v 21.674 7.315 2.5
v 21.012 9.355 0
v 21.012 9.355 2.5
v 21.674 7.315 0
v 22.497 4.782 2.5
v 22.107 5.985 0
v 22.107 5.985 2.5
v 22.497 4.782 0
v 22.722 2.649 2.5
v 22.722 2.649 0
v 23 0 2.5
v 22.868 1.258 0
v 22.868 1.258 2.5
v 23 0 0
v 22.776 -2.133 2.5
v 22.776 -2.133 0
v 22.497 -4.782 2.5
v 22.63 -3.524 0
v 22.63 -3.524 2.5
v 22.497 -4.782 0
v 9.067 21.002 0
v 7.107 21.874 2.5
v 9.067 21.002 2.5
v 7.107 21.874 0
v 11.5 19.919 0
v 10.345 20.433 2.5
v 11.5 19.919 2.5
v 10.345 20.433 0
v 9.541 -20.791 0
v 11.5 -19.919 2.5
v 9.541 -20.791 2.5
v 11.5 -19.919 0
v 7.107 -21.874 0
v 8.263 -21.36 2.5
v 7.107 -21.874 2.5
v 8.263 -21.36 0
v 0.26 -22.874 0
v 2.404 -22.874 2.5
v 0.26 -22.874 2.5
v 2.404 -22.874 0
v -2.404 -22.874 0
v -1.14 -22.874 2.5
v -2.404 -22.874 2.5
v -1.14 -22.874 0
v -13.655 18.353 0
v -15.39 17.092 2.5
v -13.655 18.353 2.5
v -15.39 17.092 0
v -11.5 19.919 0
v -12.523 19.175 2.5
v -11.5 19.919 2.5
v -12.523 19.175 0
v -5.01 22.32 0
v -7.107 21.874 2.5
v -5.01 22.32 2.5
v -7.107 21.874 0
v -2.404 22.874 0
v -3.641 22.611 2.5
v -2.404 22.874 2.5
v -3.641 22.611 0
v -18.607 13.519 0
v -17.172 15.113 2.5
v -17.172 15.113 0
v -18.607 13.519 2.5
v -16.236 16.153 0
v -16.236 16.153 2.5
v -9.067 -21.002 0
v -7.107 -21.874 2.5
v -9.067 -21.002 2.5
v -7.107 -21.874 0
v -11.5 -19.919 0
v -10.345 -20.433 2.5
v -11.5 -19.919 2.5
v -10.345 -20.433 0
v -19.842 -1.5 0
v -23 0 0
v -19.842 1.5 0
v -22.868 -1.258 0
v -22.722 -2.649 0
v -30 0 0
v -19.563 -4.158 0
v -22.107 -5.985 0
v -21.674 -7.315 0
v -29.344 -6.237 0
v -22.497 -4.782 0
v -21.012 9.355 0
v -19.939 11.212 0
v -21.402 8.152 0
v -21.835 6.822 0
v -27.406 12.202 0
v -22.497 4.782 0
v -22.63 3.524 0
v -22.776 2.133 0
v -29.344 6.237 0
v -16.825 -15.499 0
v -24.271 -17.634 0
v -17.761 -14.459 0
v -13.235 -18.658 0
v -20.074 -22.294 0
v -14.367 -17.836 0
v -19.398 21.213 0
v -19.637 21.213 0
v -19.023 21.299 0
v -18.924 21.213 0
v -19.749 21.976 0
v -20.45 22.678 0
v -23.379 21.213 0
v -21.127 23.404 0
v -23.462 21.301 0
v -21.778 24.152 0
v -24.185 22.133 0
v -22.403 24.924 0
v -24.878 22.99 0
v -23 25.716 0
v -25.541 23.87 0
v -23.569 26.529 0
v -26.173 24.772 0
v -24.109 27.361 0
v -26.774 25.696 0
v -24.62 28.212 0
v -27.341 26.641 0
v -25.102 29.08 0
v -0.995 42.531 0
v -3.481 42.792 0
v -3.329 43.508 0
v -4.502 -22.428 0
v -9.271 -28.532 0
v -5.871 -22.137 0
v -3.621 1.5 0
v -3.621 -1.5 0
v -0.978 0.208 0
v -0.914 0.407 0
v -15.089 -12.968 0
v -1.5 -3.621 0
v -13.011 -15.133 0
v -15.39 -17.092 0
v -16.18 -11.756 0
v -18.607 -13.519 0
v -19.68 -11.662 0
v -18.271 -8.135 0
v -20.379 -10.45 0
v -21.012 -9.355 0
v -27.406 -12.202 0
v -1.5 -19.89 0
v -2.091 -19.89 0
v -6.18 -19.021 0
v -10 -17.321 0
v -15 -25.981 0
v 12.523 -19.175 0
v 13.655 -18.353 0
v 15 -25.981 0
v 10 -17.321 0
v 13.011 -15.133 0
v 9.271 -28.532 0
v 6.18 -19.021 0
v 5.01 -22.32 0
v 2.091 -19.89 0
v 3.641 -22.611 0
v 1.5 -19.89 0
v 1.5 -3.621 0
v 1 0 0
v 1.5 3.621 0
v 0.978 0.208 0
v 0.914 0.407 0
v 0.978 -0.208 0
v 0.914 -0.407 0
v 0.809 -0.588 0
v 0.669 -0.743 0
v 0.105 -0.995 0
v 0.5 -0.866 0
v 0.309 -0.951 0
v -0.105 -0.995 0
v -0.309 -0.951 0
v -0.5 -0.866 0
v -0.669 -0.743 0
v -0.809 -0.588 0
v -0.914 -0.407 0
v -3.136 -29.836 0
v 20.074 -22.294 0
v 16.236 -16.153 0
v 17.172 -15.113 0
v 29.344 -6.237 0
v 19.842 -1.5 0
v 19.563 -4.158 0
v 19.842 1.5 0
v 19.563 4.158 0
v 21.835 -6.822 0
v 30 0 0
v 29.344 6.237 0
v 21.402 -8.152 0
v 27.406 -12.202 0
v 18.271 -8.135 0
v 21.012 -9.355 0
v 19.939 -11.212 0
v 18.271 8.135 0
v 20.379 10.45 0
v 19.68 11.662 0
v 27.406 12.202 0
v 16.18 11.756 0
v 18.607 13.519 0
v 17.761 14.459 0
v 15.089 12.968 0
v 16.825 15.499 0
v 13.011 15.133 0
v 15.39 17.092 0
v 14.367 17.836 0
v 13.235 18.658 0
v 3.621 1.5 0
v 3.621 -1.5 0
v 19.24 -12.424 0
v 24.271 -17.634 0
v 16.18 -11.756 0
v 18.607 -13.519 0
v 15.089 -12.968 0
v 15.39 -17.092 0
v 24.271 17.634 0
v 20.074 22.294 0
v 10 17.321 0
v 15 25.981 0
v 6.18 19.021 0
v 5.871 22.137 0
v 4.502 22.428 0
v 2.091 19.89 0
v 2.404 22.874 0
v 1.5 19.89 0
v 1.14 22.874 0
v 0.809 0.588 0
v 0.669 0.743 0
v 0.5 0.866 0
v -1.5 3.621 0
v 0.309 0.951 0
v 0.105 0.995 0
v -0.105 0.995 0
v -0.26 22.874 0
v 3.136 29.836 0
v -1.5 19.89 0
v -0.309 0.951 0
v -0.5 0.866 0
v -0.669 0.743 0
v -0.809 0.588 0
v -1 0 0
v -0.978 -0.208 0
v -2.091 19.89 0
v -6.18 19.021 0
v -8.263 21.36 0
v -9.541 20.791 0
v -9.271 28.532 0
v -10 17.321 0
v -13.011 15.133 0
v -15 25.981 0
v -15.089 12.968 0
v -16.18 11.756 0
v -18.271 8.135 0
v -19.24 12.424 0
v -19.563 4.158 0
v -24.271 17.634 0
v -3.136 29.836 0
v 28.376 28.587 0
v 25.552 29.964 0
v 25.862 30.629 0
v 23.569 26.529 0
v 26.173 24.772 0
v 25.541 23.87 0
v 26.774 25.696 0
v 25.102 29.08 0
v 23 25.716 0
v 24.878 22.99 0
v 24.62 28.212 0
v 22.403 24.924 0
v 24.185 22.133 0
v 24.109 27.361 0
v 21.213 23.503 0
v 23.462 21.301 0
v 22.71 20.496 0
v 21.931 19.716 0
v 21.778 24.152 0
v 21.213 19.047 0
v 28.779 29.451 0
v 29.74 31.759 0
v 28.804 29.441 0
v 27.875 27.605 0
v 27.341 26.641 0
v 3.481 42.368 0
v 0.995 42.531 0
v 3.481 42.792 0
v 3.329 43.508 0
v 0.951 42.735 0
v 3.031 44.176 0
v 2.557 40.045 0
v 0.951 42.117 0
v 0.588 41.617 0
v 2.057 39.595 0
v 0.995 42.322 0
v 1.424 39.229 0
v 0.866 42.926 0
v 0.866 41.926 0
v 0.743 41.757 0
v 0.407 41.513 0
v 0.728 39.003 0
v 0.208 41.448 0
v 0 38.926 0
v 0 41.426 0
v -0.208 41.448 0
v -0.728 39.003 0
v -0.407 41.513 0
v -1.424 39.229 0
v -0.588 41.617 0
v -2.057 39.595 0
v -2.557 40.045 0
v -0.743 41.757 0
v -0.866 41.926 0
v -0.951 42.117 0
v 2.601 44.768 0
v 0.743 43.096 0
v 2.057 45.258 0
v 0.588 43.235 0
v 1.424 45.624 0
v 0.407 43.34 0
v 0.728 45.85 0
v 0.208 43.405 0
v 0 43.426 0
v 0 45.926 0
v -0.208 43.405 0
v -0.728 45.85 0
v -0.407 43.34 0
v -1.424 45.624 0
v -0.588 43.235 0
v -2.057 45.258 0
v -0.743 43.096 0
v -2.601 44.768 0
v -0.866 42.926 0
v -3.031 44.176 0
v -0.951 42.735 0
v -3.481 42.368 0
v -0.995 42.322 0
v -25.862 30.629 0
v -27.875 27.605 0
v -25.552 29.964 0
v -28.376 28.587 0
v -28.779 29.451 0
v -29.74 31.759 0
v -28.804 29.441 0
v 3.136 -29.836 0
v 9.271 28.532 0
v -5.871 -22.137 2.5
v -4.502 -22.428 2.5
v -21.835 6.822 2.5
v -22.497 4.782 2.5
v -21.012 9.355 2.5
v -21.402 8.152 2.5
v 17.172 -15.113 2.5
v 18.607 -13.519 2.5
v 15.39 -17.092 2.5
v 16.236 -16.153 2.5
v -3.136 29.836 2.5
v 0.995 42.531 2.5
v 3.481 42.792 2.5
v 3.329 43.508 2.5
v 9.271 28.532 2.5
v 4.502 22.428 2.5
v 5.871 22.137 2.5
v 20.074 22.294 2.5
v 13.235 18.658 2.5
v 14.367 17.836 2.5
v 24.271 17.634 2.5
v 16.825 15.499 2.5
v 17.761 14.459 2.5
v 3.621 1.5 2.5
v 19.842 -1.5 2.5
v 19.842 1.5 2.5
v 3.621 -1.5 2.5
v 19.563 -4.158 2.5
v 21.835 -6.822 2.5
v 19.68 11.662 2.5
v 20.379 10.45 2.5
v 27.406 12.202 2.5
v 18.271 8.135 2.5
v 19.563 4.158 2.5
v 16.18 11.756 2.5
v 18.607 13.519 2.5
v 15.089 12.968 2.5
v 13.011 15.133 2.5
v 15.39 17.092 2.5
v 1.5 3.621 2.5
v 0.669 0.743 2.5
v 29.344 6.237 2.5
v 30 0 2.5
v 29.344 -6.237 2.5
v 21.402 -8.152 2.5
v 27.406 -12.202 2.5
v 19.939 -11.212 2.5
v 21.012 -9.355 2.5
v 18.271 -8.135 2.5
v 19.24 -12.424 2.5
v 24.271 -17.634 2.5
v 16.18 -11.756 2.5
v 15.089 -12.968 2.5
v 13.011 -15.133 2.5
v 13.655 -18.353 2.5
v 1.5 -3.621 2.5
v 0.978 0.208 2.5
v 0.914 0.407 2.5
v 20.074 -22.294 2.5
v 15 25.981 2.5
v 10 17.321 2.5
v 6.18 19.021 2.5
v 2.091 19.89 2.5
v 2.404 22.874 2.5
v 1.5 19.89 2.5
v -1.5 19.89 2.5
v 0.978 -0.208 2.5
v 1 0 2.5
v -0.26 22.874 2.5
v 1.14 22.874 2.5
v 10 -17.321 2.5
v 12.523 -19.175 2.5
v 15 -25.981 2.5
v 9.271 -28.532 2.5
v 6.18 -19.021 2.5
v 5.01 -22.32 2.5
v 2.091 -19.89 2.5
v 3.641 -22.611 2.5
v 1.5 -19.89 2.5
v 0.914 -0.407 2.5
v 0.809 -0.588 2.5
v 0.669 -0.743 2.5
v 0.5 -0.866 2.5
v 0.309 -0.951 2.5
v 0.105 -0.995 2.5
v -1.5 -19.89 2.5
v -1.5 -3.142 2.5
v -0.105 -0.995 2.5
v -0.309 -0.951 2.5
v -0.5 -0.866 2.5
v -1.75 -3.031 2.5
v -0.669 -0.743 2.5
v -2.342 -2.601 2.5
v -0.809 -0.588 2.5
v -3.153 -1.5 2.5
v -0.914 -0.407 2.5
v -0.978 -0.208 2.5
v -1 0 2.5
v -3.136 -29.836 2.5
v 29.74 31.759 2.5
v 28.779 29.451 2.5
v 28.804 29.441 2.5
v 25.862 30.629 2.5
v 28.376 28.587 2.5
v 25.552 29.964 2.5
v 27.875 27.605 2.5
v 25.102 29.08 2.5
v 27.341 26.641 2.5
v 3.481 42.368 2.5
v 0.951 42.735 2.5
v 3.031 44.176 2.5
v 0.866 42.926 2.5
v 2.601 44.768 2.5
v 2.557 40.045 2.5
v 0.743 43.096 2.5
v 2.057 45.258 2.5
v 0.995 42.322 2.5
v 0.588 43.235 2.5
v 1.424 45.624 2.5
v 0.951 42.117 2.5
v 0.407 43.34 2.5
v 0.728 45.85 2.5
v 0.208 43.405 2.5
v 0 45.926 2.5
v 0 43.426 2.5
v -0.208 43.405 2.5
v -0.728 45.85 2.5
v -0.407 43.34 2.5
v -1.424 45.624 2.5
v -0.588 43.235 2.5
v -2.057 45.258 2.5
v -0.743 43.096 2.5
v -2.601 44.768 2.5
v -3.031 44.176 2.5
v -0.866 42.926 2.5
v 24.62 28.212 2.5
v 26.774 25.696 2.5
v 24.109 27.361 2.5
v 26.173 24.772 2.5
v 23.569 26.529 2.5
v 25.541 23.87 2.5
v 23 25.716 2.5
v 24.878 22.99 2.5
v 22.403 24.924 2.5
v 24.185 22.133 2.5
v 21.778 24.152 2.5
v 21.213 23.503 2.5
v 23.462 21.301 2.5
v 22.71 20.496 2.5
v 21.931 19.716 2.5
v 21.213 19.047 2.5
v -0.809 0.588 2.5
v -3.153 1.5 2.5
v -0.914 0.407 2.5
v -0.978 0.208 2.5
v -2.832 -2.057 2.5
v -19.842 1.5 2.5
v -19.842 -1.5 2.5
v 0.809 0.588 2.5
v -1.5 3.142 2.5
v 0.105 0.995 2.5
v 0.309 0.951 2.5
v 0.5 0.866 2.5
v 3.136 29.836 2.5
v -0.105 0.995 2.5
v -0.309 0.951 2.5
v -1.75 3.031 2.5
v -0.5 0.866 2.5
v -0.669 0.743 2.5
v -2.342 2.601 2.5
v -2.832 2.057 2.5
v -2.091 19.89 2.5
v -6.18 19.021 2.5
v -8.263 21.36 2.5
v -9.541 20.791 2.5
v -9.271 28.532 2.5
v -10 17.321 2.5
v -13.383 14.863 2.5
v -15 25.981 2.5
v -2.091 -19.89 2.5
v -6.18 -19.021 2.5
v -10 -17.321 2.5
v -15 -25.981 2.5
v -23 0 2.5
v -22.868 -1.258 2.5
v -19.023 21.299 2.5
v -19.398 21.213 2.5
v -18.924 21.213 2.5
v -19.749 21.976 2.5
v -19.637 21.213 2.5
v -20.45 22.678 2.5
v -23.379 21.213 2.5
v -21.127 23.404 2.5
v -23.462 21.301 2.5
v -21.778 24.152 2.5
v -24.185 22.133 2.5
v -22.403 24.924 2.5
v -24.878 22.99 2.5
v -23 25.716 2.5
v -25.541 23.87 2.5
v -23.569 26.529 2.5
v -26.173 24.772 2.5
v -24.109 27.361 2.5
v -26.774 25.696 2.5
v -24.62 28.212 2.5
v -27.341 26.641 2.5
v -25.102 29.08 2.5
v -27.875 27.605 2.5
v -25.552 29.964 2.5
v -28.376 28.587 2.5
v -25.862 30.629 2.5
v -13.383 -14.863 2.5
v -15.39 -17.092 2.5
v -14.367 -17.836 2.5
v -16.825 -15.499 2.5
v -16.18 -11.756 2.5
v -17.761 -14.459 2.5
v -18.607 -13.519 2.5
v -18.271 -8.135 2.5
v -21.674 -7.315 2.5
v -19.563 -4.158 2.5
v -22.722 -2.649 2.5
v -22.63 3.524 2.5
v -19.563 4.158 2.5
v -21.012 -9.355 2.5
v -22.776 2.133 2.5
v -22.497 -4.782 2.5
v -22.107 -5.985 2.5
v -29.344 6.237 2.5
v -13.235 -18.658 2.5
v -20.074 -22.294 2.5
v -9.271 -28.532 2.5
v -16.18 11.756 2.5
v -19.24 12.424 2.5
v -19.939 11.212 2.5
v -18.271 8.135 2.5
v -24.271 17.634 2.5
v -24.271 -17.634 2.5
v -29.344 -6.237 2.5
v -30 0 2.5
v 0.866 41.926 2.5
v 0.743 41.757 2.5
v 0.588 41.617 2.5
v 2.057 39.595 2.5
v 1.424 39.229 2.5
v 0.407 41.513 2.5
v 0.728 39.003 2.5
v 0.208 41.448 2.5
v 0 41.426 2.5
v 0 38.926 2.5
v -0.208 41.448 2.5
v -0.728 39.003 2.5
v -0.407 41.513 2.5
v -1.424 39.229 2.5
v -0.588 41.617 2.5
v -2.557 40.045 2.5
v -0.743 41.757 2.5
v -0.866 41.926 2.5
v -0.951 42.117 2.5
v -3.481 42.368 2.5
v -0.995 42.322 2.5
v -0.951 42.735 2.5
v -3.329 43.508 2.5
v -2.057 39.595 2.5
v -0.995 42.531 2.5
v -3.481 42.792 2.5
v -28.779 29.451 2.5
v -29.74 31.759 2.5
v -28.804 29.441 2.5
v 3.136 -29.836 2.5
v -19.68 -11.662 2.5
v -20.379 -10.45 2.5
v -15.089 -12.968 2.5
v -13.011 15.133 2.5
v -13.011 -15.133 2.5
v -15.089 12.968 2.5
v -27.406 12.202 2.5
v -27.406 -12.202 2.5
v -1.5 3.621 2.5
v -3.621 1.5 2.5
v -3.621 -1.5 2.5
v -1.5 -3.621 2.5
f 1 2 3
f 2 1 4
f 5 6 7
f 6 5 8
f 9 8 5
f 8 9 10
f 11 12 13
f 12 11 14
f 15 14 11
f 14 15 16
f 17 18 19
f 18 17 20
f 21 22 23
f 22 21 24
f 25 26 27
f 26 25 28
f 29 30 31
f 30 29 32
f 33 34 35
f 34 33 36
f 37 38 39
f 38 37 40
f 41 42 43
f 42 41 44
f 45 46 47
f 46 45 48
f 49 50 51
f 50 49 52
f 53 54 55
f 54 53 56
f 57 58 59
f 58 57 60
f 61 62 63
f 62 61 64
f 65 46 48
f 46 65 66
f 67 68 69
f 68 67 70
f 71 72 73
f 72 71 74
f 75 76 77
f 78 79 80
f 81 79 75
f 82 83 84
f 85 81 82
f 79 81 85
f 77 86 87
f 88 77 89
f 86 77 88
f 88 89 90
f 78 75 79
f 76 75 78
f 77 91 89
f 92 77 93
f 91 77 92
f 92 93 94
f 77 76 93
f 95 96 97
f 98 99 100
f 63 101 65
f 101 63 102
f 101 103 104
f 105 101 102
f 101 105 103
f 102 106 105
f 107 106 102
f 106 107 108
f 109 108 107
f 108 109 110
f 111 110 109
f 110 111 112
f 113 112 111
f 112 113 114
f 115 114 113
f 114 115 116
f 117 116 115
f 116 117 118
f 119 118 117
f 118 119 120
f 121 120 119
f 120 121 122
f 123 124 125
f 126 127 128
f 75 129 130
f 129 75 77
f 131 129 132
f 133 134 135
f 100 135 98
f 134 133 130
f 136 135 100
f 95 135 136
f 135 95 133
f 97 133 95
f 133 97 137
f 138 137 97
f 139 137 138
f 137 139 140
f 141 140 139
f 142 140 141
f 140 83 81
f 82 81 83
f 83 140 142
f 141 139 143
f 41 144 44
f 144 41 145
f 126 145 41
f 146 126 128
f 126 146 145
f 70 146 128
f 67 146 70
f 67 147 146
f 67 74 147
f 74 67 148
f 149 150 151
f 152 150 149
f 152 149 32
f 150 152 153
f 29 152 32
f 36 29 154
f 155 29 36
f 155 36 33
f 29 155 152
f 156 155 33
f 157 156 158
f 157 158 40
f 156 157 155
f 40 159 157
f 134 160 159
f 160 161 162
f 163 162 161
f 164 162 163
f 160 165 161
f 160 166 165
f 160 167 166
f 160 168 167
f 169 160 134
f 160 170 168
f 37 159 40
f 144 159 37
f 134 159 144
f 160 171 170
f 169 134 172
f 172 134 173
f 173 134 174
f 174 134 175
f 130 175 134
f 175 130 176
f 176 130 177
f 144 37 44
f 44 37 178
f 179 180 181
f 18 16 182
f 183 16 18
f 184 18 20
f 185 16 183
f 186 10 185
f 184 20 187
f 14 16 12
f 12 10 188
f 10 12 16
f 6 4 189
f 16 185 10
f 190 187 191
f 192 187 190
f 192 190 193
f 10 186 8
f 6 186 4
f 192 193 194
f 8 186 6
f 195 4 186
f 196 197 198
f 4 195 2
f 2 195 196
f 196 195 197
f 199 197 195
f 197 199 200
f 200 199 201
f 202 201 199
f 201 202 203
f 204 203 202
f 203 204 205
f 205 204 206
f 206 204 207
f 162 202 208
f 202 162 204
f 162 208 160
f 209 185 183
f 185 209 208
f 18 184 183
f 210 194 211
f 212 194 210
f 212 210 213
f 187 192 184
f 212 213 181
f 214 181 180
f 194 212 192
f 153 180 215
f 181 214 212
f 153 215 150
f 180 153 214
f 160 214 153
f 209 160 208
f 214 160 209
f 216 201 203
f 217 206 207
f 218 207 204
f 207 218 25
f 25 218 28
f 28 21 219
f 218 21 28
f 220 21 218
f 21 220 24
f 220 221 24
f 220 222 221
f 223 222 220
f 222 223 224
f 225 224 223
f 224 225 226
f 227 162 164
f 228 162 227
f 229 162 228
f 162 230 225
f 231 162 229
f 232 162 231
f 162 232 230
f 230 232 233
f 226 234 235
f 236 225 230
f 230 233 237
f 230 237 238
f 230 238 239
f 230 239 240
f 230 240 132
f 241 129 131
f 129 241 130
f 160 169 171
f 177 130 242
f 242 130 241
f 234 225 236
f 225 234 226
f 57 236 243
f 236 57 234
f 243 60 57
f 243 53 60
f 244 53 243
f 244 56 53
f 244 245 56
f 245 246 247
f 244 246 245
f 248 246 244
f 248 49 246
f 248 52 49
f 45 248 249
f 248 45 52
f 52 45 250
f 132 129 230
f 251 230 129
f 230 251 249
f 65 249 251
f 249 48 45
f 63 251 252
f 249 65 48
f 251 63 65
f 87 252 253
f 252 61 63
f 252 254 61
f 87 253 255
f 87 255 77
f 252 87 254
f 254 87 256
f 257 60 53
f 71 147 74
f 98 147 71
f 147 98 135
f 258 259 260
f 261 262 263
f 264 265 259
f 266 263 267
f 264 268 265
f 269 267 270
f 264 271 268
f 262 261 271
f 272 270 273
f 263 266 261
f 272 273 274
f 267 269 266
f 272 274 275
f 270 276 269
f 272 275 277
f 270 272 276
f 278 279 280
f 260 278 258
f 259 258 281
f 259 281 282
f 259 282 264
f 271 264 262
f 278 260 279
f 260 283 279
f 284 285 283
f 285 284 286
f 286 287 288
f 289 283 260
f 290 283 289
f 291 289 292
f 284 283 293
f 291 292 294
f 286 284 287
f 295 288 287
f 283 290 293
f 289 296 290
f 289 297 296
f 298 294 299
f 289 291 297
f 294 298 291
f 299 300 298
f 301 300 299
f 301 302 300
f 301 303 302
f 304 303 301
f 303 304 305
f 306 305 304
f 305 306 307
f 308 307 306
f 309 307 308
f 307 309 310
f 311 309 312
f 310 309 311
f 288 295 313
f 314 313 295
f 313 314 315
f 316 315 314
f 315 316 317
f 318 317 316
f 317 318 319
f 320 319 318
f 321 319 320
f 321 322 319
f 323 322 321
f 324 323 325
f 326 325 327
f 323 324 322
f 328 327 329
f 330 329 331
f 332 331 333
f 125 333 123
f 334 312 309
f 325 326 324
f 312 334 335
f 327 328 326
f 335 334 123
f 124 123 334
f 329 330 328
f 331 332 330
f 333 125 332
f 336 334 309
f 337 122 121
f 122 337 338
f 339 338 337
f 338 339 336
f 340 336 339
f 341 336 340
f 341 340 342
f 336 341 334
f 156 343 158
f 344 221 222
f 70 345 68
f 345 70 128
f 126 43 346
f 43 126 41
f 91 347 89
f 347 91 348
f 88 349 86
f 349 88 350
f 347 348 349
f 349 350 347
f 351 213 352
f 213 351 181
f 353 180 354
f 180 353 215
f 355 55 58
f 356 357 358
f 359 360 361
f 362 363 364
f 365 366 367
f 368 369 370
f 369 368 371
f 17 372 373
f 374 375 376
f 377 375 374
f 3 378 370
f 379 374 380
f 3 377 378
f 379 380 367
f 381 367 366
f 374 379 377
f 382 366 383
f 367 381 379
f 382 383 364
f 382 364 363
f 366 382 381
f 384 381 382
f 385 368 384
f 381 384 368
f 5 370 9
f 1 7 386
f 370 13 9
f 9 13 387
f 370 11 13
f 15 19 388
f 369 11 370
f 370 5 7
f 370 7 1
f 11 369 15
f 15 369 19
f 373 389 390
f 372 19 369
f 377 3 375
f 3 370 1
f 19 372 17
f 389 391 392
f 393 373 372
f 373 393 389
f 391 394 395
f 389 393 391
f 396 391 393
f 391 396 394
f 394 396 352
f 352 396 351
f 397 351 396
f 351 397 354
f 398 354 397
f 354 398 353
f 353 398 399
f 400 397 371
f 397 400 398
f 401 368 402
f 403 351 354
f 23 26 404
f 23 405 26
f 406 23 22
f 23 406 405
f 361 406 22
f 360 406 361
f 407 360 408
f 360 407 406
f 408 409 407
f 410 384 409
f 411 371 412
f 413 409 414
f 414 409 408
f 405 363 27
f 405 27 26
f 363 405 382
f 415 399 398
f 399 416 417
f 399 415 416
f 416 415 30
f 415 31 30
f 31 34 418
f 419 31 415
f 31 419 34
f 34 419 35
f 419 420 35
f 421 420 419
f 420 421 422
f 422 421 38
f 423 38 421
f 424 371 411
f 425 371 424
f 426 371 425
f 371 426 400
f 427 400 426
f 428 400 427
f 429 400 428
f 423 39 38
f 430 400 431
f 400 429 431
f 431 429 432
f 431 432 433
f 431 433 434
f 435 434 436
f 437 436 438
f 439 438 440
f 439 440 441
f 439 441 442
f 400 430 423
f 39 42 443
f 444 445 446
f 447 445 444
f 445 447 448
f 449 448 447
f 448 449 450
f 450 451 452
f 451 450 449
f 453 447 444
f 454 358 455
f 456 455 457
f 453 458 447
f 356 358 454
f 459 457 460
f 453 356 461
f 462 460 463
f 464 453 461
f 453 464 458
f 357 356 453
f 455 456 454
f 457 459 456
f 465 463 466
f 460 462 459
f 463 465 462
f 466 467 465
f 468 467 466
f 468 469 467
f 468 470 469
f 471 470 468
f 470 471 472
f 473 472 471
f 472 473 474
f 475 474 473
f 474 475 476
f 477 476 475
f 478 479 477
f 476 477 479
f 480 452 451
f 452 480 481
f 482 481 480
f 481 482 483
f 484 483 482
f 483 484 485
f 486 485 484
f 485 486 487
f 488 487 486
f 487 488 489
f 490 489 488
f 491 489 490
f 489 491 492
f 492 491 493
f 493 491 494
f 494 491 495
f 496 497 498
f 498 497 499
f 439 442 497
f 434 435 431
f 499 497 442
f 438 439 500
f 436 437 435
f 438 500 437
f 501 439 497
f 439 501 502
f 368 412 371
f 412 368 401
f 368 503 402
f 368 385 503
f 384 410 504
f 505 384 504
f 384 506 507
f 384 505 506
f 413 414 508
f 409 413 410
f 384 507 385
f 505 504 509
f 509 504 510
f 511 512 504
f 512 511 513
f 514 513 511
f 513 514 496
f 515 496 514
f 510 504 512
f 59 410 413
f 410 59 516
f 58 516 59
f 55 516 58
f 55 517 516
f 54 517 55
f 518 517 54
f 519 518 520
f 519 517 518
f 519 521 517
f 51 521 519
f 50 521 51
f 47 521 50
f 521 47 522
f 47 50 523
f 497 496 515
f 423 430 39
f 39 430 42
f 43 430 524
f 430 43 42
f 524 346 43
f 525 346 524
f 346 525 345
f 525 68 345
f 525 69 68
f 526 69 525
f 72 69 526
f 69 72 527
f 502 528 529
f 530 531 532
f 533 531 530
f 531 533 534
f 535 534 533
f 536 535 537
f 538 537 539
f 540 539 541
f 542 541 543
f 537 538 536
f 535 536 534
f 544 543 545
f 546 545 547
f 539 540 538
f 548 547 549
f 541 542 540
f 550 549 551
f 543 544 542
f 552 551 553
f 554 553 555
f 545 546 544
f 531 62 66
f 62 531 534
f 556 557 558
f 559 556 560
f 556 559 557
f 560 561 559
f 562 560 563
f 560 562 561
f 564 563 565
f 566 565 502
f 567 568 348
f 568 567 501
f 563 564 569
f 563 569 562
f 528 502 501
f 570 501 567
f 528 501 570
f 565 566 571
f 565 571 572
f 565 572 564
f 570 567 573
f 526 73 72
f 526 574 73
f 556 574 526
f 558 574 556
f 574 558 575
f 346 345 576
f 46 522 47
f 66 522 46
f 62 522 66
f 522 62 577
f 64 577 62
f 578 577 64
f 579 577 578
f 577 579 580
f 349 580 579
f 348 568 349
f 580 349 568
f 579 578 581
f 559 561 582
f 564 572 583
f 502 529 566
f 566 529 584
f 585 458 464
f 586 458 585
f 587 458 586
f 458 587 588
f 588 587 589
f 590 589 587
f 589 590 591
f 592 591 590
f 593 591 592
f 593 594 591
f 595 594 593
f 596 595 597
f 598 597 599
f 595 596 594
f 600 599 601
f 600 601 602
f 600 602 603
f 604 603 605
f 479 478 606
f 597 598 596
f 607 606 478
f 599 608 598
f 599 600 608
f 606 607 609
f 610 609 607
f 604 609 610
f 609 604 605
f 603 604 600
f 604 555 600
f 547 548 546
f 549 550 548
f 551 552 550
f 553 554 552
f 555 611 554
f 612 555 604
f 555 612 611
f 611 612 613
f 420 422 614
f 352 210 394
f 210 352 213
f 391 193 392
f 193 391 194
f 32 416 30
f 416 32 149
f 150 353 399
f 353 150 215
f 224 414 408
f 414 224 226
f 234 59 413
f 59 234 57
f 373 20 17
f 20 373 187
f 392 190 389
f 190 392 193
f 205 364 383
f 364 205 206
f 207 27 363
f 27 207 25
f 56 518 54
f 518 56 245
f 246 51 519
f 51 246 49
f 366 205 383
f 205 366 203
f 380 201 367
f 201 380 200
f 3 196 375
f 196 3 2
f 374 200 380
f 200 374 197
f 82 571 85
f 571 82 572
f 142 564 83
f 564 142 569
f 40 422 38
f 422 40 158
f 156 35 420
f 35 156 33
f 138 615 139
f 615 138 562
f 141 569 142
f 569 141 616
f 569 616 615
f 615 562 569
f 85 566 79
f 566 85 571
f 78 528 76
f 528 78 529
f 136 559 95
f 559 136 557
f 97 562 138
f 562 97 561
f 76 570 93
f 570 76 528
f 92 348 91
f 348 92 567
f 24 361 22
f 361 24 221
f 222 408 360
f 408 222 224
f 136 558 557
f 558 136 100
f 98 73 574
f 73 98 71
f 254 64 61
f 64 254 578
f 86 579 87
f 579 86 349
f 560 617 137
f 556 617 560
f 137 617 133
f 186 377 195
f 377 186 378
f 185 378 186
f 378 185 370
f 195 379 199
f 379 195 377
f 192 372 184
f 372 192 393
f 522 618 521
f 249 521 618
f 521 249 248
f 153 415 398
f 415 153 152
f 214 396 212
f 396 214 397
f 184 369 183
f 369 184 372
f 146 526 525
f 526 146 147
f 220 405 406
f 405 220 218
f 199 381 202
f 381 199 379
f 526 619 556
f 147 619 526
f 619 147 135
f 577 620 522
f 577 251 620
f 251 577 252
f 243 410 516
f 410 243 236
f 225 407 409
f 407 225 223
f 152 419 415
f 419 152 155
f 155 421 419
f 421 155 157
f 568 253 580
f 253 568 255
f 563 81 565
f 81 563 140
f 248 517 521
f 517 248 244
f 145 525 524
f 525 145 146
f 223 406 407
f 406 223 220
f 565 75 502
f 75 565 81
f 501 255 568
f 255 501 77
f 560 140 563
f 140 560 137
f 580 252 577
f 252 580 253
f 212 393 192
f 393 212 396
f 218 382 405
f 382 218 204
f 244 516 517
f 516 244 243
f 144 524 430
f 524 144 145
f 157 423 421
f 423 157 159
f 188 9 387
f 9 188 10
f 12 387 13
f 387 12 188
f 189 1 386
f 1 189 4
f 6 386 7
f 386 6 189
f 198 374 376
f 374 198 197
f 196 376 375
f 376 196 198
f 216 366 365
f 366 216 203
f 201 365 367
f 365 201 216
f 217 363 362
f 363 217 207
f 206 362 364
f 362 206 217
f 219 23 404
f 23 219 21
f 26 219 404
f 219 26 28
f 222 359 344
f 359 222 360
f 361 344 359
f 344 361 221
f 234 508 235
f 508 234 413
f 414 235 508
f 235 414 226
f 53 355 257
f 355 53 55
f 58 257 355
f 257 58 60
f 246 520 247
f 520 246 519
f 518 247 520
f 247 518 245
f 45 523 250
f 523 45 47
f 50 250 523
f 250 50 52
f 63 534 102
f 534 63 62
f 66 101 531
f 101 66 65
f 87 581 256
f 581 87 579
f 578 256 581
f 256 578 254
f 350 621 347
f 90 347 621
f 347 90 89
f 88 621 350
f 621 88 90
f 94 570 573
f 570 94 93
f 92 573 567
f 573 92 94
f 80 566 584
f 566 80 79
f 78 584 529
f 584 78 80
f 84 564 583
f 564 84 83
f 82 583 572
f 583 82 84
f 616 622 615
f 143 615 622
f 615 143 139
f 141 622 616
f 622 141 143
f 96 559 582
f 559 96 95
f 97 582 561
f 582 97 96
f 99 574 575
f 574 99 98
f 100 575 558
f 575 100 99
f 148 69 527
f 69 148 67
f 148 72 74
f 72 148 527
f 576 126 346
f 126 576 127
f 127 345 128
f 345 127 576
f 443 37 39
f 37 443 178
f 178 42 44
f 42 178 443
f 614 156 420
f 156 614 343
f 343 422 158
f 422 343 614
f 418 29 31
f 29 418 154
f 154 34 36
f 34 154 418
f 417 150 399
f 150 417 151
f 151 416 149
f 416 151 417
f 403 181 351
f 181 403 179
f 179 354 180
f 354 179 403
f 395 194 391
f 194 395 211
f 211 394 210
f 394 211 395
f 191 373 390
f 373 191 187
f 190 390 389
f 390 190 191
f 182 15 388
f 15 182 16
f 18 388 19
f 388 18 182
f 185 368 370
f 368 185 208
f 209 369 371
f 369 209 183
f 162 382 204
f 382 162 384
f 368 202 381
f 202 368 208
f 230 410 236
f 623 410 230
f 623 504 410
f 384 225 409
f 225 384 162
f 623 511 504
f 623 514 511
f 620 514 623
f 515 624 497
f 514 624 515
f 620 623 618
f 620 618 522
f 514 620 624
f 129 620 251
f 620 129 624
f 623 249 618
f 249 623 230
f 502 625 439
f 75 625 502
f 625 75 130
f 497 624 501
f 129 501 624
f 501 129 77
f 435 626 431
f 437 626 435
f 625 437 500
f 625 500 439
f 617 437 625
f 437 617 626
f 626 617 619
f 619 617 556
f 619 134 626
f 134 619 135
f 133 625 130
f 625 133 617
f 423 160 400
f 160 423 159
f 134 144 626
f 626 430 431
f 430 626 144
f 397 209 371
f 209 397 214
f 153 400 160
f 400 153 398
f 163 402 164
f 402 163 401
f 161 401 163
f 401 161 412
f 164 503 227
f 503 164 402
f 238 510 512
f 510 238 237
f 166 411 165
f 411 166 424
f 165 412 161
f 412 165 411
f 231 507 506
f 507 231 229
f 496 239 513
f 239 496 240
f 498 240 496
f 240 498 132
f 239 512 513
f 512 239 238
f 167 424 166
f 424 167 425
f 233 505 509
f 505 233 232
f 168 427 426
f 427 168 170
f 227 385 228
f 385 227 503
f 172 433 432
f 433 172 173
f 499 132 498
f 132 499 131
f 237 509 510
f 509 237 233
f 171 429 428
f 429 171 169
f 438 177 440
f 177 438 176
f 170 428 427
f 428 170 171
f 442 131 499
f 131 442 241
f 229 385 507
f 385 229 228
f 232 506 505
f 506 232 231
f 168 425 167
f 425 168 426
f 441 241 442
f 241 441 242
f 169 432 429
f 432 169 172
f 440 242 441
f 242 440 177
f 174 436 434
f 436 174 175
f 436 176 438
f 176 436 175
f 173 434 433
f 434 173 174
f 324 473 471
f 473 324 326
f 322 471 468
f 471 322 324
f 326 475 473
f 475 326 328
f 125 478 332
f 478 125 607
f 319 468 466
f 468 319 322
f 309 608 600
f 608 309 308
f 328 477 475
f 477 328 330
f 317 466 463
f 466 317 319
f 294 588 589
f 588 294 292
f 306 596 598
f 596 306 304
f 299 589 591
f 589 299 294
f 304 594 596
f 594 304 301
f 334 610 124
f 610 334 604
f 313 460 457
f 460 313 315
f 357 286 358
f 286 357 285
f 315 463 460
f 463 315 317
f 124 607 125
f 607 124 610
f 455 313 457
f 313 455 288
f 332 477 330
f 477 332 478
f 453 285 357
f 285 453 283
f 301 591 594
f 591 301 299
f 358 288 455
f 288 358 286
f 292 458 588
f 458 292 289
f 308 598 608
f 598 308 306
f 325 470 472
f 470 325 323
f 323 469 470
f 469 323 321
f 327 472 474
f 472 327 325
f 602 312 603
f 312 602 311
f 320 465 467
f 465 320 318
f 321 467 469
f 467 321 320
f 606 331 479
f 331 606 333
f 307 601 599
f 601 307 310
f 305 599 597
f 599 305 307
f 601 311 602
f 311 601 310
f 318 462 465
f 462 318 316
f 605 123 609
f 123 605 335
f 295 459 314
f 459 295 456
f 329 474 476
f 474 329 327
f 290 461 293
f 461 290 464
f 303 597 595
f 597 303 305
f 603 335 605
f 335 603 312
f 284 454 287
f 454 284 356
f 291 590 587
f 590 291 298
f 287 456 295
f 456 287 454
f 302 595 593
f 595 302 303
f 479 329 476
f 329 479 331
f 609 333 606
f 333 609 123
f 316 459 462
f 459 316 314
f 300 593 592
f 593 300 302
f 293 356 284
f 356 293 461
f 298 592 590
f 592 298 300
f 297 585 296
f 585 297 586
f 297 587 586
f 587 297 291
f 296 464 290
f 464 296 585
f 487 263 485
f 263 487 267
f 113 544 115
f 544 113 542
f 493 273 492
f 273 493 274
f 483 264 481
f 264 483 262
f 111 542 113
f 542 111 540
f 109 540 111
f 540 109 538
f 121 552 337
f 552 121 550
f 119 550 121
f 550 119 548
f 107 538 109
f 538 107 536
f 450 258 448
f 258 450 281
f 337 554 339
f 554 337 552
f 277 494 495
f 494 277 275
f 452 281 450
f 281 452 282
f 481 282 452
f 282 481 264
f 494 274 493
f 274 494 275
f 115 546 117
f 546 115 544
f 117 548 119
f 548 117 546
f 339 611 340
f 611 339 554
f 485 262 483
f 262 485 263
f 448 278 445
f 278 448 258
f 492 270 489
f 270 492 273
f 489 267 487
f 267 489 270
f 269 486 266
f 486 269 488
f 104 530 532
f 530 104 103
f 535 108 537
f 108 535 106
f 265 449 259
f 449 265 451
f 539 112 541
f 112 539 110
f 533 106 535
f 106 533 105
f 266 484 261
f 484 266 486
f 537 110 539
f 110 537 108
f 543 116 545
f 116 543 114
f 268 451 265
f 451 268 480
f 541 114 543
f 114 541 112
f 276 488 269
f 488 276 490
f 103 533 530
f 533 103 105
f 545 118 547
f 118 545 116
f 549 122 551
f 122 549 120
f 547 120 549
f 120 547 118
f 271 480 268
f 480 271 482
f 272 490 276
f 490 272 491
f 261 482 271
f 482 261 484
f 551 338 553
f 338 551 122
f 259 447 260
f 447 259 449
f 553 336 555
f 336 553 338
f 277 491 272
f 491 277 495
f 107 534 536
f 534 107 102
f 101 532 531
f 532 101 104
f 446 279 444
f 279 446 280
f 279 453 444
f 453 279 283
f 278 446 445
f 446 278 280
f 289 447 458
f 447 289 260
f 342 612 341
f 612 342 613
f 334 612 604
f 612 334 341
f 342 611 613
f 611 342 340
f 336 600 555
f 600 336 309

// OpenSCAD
module ring(outerRadius,innerRadius,thickness,outerSegmentAngle=30,innerSegmentAngle=30)
// creates a hollow cylinder
// outerRadius and innerRadius should be self-explanatory
// thickess is along z
// outerSegmentAngle is an optional override of the system variable $fa
// innerSegmentAngle is an optional override of the system variable $fa
{
  difference()
    {
      cylinder(thickness,outerRadius,outerRadius,$fn=outerSegmentAngle);
      cylinder(thickness,innerRadius,innerRadius,,$fn=innerSegmentAngle);
    }
}

module tooth(toothLength,thickness,toothLean,toothSharpness)
// creates a triangular tooth, sharp end at origin
// toothLength is measured along longest side
// thickess is along z
// toothLean measures how far the tooth leans over, in degrees
// toothSharpness measures how sharp the tooth is, in degrees
{
      rotate(-toothLean,[0,0,1])
      rotate(180,[0,0,1])
      difference()
      {
        cube([toothLength,toothLength,thickness]);
        rotate(toothSharpness,[0,0,1])
        cube([toothLength*2,toothLength,thickness]);
      }
}

module ringTooth(outerRadius,innerRadius,thickness,numberTeeth,toothLength)
// creates a ring with the child spaced regularly along the outside edge of the inner radius
// outerRadius and innerRadius should be self-explanatory
// thickess is along z 
// numberTeeth controls how many instances of the child are used
// toothlength is used to offset the teeth outward, if needed
{
  union()
  {
    ring(outerRadius,innerRadius,thickness);
    for ( i=[0:numberTeeth])
   {
      rotate(i*360/numberTeeth,[0,0,1])
      translate([innerRadius+toothLength,0,0]) 
      child(0);
    }
  }
}

module escapementWheel(radius,rimWidth,thickness,numberTeeth,toothLength,toothLean,toothSharpness,numberSpokes,spokeWidth,hubWidth,bore)
// creates an escapement wheel
// radius is the outer radius measured from the tooth tips
// rimWidth is the width of the rim of the wheel, measured radially
// thickess is along z
// numberTeeth controls how many teeth the wheel has
// toothLength is the length of each tooth, 
// toothLean measures how far the tooth leans over clockwise, in degrees
// toothSharpness measures how sharp the tooth is, in degrees
// numberSpokes controls the number of spokes of the wheel
// spokeWidth controls the width of the spokes of the wheel
// hubWidth controls the width of the hub
// bore controls the size of the bore in the hub
{
  union()
  {
    ringTooth(radius-toothLength+rimWidth,radius-toothLength,thickness,numberTeeth,toothLength) tooth(toothLength,thickness,toothLean,toothSharpness);
    for ( j=[0:numberSpokes-1])
   {
      rotate(360/numberSpokes*j,[0,0,1]) 
      translate([bore,-spokeWidth/2,0]) 
      cube([radius-toothLength-bore,spokeWidth,thickness]);
    }
    ring(hubWidth,bore,thickness);
  }
}

module escapement(radius,thickness,faceAngle,armAngle,armWidth,numberTeeth,toothSpan,hubWidth,bore)
// creates a Graham escapement
// radius is the radius of the wheel, not of the escapement
// thickess is along z
// faceAngle controls how many degrees the impulse face covers seen from the hub of the escapement wheel
// armAngle controls the angle of the escapement's arms, 0= no bend
// armWidth controls the width of the arms
// numberTeeth is the number of teeth of the wheel
// toothSpan is how many teeth the escapement spans 
// hubWidth controls the width of the hub
// bore controls the size of the bore in the hub
{
  faceWidth=2*3.1415*radius*faceAngle/360; // calculate once
  escapementAngle=180/numberTeeth*toothSpan; // calculate once

  rotate(90,[0,0,1]) // rotates escapement so pendulum is along y axis
  union()
  {
    // this is the hub
    ring(hubWidth,bore,thickness);

    // this is the pair of pallets (an entry and an exit pallet)
    for ( k=[0,1]) // k=0 is the exit pallet, and k=1 is the entry pallet
    {
      // this is the arm of the pallet
      rotate(-90-armAngle+k*(180+2*armAngle),[0,0,1]) 
      translate([bore,-armWidth/2,0]) 
      cube([radius+faceWidth/2-bore,armWidth,thickness]);

      // this is the pallet itself
      intersection()
      {
       // this is the ring from which the "dead" faces are made
       // it is important that the arcs be smooth, i.e. $fn high
       // otherwise, there would be some recoil
        ring(radius+faceWidth/2,radius-faceWidth/2,thickness,180,180);

        // this is the cube which cuts the pallet where it meets the arm
        rotate(-90-armAngle+k*(2*armAngle+180),[0,0,1])
        translate([radius,0,0])
        rotate(180-180*k,[0,0,1]) 
        translate([-0.5*radius,0,-radius])
        cube(2*radius);

        // this is the cube which cuts the pallet at the impulse face
        translate([-2*radius*cos(escapementAngle),0,0])
        rotate(-escapementAngle,[0,0,1])
        rotate(2*escapementAngle*k,[0,0,1])
        translate([radius,0,0])
        rotate(-135,[0,0,1]) 
        translate([-0.5*radius,0,-radius])
        cube(2*radius);
      }
    }
  }
}

scale=0.5; // scaling factor for the whole model
radius=60*scale; // escapement wheel radius, including the teeth
thickness=5*scale; // thickness along the Z axis
bore=2*scale; // radius of the bores on the wheel and the escapement

rimWidth=6*scale; // width of the escapement wheel's rim
numberSpokes=8; // number of spokes in the escapement wheel
spokeWidth=6*scale; // width of the escapement wheel's spokes

numberTeeth=30;  // number of teeth in the escapement wheel
toothLength=20*scale; // length of the tooth along longest face and to inner radius of the wheel (the tip of the tooth is what counts, not the base)
toothLean=20; // how much the tooth leans over, clockwise, in degrees
toothSharpness=10; //the angle between the two side of each tooth

toothSpan=7.5; // how many teeth the escapement spans
faceAngle=6; // how many degrees the impulse face covers seen from the hub of the escapement wheel
armAngle=22; // angle of the escapement's arms
armWidth=5*scale; //width of the escapement's arms
hubWidth=7*scale; //width of the escapement's hub

escapementWheel(radius,rimWidth,thickness,numberTeeth,toothLength,toothLean,toothSharpness,numberSpokes,spokeWidth,hubWidth,bore);

translate([0,2*radius*cos(180/numberTeeth*toothSpan),0])
escapement(radius,thickness,faceAngle,armAngle,armWidth,numberTeeth,toothSpan,hubWidth,bore);
